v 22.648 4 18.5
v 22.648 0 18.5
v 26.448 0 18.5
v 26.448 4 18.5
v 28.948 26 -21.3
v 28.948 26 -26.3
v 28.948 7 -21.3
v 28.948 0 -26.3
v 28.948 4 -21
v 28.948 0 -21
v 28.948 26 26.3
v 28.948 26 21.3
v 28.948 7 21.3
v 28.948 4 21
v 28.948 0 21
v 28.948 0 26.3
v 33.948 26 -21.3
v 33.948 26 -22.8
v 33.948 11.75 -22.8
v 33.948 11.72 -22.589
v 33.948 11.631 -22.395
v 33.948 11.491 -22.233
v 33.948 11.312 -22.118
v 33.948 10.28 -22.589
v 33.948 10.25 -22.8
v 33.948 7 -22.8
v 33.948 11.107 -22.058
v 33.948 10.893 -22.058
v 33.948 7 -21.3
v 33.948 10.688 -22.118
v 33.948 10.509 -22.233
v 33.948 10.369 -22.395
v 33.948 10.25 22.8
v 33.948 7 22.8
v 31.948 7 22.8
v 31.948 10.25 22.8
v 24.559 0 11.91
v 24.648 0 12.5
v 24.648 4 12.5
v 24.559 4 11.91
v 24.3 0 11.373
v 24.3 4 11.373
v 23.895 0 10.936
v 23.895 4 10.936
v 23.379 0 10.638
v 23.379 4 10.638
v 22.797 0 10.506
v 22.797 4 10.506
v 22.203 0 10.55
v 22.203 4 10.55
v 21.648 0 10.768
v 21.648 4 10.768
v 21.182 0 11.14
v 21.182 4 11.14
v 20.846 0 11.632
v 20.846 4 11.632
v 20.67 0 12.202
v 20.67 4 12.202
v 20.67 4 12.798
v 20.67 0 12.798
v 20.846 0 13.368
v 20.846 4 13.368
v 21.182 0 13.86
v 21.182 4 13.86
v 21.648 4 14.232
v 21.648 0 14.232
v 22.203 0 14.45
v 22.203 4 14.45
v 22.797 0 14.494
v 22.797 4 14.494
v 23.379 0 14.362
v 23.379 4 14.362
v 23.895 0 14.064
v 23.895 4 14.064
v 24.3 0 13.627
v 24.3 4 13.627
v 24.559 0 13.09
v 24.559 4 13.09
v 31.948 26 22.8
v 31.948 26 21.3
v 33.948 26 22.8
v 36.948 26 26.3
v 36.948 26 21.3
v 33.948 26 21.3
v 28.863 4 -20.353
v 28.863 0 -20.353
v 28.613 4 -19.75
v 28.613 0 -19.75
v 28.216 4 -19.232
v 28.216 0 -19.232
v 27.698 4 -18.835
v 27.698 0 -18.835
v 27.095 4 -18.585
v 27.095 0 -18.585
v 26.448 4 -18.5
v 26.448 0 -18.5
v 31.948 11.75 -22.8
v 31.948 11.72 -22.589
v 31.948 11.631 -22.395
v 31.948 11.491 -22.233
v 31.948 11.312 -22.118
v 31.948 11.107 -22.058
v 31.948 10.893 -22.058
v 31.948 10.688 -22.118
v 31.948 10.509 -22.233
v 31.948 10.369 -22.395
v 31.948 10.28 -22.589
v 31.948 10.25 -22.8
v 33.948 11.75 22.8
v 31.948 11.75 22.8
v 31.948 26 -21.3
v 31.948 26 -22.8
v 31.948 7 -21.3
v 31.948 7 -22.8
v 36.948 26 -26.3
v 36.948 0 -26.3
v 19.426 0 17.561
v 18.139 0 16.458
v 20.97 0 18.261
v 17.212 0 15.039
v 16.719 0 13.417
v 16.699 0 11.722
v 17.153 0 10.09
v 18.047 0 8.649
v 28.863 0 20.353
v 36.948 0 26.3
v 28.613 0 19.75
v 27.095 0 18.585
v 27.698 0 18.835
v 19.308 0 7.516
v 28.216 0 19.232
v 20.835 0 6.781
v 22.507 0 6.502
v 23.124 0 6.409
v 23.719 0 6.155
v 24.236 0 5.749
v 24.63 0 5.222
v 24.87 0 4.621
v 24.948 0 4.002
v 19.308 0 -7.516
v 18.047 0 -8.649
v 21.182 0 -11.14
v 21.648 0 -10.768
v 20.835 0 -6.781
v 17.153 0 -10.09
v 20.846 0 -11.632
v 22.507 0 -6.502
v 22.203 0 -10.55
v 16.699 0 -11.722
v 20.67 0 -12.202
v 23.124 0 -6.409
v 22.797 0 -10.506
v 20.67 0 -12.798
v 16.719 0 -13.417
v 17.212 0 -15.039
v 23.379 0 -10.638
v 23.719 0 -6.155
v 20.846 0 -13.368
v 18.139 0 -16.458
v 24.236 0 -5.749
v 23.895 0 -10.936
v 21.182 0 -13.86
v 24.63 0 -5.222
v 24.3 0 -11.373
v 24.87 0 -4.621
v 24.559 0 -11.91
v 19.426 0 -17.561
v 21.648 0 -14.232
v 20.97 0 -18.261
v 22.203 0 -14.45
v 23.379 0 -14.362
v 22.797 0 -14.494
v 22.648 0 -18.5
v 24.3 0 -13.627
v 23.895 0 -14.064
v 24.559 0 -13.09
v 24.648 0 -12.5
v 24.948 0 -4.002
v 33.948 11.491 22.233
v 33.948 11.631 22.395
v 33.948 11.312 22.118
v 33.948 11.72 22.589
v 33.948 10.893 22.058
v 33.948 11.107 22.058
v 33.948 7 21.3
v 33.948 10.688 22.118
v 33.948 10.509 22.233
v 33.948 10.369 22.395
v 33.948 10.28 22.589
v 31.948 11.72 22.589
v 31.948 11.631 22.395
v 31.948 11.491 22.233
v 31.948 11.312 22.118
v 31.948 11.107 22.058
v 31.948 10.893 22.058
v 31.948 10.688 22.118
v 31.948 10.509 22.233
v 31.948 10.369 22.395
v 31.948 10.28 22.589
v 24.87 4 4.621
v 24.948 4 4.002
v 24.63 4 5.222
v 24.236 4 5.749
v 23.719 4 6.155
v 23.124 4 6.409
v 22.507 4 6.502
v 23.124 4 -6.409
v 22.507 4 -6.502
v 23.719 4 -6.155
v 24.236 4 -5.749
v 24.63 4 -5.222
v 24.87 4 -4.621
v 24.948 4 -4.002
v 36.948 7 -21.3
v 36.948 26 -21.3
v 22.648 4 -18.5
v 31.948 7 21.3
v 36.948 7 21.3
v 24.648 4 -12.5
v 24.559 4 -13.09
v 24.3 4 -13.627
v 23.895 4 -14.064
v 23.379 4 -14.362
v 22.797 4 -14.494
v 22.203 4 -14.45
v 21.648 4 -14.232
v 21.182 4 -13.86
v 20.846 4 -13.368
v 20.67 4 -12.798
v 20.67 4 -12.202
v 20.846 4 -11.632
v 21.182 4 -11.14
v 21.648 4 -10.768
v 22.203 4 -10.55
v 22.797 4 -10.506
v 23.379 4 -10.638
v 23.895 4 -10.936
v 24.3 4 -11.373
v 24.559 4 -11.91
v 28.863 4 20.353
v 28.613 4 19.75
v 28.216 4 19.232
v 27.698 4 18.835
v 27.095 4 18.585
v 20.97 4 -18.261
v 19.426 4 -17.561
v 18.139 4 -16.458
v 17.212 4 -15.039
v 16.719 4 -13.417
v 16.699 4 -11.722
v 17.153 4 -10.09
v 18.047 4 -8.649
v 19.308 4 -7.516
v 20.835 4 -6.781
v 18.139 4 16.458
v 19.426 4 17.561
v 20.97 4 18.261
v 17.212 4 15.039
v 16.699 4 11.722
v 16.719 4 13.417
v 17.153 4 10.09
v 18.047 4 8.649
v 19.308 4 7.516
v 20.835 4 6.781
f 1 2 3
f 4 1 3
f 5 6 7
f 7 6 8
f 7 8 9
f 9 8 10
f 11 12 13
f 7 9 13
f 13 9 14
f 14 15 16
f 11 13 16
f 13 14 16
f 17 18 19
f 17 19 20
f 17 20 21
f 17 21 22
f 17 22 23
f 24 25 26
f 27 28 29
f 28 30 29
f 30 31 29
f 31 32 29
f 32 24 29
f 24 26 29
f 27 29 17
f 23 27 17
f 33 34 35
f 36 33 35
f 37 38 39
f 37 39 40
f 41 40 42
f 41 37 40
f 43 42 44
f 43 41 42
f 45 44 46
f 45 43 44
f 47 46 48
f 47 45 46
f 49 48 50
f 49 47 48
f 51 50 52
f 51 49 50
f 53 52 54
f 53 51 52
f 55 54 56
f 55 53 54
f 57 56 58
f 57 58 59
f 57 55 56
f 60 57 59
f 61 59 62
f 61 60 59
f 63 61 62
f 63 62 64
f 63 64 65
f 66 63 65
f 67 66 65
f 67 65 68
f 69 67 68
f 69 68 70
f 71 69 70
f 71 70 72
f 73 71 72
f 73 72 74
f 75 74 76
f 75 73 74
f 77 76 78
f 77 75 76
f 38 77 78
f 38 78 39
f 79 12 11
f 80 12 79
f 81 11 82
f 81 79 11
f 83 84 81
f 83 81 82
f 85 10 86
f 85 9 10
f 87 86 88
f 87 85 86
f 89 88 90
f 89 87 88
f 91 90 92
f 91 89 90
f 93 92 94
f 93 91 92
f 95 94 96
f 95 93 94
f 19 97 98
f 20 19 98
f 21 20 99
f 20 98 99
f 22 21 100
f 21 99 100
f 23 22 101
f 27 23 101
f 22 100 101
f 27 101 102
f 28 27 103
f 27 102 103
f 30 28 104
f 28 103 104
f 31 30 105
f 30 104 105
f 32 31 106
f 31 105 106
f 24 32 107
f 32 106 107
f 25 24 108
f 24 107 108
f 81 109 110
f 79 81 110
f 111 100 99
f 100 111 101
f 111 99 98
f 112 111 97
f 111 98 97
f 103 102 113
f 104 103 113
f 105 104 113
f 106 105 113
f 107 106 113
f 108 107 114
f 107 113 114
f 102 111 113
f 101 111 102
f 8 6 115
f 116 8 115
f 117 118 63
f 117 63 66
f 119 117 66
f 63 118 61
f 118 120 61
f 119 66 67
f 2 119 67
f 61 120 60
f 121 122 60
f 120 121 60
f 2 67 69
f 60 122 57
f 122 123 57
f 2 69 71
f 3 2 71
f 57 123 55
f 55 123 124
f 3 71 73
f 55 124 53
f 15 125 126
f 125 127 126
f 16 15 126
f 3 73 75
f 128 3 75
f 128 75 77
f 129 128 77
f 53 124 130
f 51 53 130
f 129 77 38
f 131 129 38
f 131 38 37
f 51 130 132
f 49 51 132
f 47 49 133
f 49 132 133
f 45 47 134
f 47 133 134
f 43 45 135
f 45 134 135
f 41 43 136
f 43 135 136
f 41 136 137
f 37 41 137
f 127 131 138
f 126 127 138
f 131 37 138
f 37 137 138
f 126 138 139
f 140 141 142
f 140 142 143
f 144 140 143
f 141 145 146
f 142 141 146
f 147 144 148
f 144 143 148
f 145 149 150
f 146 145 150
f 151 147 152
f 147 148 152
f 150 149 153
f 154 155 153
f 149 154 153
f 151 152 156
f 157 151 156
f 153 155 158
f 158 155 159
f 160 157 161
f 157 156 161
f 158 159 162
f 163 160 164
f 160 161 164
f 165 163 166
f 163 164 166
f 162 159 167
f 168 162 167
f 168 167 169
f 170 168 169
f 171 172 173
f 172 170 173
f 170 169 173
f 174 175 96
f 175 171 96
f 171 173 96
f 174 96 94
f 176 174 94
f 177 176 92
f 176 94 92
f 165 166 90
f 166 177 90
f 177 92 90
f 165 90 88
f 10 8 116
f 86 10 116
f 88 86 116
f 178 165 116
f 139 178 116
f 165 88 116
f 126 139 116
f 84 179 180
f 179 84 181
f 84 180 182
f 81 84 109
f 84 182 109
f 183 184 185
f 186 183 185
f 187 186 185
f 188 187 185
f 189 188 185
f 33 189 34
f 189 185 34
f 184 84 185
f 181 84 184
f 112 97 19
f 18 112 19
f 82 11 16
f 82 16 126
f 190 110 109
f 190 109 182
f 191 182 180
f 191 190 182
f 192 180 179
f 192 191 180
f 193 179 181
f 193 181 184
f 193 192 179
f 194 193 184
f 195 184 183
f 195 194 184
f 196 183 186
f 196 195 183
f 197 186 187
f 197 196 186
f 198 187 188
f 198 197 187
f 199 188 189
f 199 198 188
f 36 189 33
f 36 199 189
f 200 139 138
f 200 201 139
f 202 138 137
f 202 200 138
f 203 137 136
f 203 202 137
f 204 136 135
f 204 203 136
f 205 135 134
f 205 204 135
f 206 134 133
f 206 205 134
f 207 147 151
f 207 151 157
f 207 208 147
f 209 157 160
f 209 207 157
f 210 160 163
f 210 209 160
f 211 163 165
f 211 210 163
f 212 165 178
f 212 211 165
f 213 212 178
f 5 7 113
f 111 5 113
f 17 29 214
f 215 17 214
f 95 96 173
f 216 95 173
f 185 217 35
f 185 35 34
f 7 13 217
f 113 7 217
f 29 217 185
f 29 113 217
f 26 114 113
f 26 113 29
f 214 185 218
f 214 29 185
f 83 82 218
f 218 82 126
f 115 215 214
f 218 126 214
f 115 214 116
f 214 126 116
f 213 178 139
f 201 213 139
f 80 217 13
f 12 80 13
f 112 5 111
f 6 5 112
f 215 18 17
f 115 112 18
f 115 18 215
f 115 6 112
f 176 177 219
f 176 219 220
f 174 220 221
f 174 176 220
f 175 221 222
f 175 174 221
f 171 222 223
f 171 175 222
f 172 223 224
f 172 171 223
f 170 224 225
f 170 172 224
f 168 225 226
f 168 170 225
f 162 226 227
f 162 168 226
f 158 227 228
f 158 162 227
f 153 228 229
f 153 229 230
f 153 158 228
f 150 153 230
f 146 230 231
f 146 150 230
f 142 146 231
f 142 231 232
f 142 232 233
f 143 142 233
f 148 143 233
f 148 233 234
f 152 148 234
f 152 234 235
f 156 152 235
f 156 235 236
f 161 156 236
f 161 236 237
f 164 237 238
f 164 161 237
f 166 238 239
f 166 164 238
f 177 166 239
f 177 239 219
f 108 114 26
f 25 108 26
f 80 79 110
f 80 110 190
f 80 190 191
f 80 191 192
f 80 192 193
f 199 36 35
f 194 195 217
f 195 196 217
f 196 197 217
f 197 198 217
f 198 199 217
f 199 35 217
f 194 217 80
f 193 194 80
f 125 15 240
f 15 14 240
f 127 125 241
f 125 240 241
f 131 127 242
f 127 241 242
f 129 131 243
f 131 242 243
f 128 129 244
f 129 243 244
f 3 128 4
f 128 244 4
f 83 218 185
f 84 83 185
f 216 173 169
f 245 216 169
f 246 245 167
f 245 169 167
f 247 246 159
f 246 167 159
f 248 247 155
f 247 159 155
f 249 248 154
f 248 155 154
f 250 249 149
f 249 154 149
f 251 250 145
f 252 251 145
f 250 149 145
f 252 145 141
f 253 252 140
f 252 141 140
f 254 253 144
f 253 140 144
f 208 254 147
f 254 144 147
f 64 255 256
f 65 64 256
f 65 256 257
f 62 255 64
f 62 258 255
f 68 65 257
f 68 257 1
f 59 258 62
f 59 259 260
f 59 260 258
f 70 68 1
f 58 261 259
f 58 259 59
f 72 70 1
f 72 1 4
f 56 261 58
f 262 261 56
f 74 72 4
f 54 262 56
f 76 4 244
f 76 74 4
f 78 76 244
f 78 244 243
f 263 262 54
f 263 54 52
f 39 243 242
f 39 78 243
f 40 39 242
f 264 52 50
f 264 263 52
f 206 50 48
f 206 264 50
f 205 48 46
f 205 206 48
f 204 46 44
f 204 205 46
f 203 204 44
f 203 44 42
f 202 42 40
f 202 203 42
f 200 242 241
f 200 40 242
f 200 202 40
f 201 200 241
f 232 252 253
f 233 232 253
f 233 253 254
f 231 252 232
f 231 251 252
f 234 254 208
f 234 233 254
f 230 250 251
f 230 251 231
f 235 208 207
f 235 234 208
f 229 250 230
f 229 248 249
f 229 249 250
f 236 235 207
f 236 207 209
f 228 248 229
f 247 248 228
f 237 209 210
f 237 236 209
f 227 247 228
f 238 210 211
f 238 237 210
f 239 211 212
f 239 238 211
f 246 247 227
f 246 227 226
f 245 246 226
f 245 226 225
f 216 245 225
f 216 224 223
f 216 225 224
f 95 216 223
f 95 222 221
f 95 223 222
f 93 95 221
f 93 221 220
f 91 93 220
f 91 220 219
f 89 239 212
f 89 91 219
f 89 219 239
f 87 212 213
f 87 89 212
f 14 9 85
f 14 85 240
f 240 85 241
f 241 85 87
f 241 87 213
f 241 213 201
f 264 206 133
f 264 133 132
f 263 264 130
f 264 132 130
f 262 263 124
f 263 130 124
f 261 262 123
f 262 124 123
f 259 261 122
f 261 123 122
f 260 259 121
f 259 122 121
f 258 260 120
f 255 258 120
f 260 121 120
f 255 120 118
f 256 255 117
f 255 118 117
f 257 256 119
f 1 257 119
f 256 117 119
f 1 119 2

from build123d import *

# Parameters (mm, degrees)
SKETCH1_R           = 2
BOSS_EXTRUDE1_DEPTH = 4
SKETCH1_3_W         = 8
SKETCH1_3_H         = 18.5
SKETCH1_3_H_2       = 7.8
BOSS_EXTRUDE2_DEPTH = 7
BOSS_EXTRUDE3_DEPTH = 22
BOSS_EXTRUDE4_DEPTH = 2
FILLET1_R           = 2.5


with BuildPart() as part:
    # Sketch1 → Boss-Extrude1 (new body)
    with BuildSketch(Plane(origin=(0, 0, 0), x_dir=(1, 0, 0), z_dir=(0, 1, 0))):
        with BuildLine():
            Line((28.947984737, 18.5), (22.647984737, 18.5))
            ThreePointArc((22.647984737, 18.5), (16.647984737, 12.5), (22.647984737, 6.5))
            Line((22.647984737, 6.5), (24.947984737, 6.5))
            Line((24.947984737, 6.5), (24.947984737, -6.5))
            Line((24.947984737, -6.5), (22.647984737, -6.5))
            ThreePointArc((22.647984737, -6.5), (16.647984737, -12.5), (22.647984737, -18.5))
            Line((22.647984737, -18.5), (28.947984737, -18.5))
            Line((28.947984737, -18.5), (28.947984737, 18.5))
        make_face()
        with Locations((22.647984737, 12.5)):
            Circle(SKETCH1_R, mode=Mode.SUBTRACT)
        with Locations((22.647984737, -12.5)):
            Circle(SKETCH1_R, mode=Mode.SUBTRACT)
    extrude(amount=BOSS_EXTRUDE1_DEPTH)

    # Sketch1<3> → Boss-Extrude2 (add)
    with BuildSketch(Plane(origin=(0, 0, 0), x_dir=(1, 0, 0), z_dir=(0, 1, 0))):
        with Locations((32.947984737, 9.25)):
            Rectangle(SKETCH1_3_W, SKETCH1_3_H)
        with Locations((32.947984737, -9.25)):
            Rectangle(SKETCH1_3_W, SKETCH1_3_H)
        with Locations((32.947984737, 22.4)):
            Rectangle(SKETCH1_3_W, SKETCH1_3_H_2)
        with Locations((32.947984737, -22.4)):
            Rectangle(SKETCH1_3_W, SKETCH1_3_H_2)
    extrude(amount=BOSS_EXTRUDE2_DEPTH)

    # Sketch5 → Boss-Extrude3 (add)
    with BuildSketch(Plane(origin=(0, 4, 0), x_dir=(1, 0, 0), z_dir=(0, 1, 0))):
        Polygon((31.947984737, 21.3), (31.947984737, 22.8), (32.947984737, 22.8), (32.947984737, 26.3), (28.947984737, 26.3), (28.947984737, 21.3), align=None)
        Polygon((32.947984737, 26.3), (32.947984737, 22.8), (33.947984737, 22.8), (33.947984737, 21.3), (36.947984737, 21.3), (36.947984737, 26.3), align=None)
        Polygon((36.947984737, -26.3), (36.947984737, -21.3), (33.947984737, -21.3), (33.947984737, -22.8), (32.947984737, -22.8), (32.947984737, -26.3), align=None)
        Polygon((28.947984737, -26.3), (32.947984737, -26.3), (32.947984737, -22.8), (31.947984737, -22.8), (31.947984737, -21.3), (28.947984737, -21.3), align=None)
    extrude(amount=BOSS_EXTRUDE3_DEPTH)

    # Sketch6 → Boss-Extrude4 (add)
    with BuildSketch(Plane(origin=(31.947984737, 0, 0), x_dir=(0, 0, -1), z_dir=(1, 0, 0))):
        with BuildLine():
            Line((22.8, 10.25), (22.8, 11.75))
            ThreePointArc((22.8, 11.75), (22.05, 11), (22.8, 10.25))
        make_face()
        with BuildLine():
            ThreePointArc((-22.8, 11.75), (-22.05, 11), (-22.8, 10.25))
            Line((-22.8, 10.25), (-22.8, 11.75))
        make_face()
    extrude(amount=BOSS_EXTRUDE4_DEPTH)

    # Fillet1
    fillet1_edges = [part.edges().sort_by_distance(p)[0] for p in [
        (28.947984737, 2, 18.5),
        (24.947984737, 2, 6.5),
        (24.947984737, 2, -6.5),
        (28.947984737, 2, -18.5),
    ]]
    fillet(fillet1_edges, radius=FILLET1_R)


solid = part.part
